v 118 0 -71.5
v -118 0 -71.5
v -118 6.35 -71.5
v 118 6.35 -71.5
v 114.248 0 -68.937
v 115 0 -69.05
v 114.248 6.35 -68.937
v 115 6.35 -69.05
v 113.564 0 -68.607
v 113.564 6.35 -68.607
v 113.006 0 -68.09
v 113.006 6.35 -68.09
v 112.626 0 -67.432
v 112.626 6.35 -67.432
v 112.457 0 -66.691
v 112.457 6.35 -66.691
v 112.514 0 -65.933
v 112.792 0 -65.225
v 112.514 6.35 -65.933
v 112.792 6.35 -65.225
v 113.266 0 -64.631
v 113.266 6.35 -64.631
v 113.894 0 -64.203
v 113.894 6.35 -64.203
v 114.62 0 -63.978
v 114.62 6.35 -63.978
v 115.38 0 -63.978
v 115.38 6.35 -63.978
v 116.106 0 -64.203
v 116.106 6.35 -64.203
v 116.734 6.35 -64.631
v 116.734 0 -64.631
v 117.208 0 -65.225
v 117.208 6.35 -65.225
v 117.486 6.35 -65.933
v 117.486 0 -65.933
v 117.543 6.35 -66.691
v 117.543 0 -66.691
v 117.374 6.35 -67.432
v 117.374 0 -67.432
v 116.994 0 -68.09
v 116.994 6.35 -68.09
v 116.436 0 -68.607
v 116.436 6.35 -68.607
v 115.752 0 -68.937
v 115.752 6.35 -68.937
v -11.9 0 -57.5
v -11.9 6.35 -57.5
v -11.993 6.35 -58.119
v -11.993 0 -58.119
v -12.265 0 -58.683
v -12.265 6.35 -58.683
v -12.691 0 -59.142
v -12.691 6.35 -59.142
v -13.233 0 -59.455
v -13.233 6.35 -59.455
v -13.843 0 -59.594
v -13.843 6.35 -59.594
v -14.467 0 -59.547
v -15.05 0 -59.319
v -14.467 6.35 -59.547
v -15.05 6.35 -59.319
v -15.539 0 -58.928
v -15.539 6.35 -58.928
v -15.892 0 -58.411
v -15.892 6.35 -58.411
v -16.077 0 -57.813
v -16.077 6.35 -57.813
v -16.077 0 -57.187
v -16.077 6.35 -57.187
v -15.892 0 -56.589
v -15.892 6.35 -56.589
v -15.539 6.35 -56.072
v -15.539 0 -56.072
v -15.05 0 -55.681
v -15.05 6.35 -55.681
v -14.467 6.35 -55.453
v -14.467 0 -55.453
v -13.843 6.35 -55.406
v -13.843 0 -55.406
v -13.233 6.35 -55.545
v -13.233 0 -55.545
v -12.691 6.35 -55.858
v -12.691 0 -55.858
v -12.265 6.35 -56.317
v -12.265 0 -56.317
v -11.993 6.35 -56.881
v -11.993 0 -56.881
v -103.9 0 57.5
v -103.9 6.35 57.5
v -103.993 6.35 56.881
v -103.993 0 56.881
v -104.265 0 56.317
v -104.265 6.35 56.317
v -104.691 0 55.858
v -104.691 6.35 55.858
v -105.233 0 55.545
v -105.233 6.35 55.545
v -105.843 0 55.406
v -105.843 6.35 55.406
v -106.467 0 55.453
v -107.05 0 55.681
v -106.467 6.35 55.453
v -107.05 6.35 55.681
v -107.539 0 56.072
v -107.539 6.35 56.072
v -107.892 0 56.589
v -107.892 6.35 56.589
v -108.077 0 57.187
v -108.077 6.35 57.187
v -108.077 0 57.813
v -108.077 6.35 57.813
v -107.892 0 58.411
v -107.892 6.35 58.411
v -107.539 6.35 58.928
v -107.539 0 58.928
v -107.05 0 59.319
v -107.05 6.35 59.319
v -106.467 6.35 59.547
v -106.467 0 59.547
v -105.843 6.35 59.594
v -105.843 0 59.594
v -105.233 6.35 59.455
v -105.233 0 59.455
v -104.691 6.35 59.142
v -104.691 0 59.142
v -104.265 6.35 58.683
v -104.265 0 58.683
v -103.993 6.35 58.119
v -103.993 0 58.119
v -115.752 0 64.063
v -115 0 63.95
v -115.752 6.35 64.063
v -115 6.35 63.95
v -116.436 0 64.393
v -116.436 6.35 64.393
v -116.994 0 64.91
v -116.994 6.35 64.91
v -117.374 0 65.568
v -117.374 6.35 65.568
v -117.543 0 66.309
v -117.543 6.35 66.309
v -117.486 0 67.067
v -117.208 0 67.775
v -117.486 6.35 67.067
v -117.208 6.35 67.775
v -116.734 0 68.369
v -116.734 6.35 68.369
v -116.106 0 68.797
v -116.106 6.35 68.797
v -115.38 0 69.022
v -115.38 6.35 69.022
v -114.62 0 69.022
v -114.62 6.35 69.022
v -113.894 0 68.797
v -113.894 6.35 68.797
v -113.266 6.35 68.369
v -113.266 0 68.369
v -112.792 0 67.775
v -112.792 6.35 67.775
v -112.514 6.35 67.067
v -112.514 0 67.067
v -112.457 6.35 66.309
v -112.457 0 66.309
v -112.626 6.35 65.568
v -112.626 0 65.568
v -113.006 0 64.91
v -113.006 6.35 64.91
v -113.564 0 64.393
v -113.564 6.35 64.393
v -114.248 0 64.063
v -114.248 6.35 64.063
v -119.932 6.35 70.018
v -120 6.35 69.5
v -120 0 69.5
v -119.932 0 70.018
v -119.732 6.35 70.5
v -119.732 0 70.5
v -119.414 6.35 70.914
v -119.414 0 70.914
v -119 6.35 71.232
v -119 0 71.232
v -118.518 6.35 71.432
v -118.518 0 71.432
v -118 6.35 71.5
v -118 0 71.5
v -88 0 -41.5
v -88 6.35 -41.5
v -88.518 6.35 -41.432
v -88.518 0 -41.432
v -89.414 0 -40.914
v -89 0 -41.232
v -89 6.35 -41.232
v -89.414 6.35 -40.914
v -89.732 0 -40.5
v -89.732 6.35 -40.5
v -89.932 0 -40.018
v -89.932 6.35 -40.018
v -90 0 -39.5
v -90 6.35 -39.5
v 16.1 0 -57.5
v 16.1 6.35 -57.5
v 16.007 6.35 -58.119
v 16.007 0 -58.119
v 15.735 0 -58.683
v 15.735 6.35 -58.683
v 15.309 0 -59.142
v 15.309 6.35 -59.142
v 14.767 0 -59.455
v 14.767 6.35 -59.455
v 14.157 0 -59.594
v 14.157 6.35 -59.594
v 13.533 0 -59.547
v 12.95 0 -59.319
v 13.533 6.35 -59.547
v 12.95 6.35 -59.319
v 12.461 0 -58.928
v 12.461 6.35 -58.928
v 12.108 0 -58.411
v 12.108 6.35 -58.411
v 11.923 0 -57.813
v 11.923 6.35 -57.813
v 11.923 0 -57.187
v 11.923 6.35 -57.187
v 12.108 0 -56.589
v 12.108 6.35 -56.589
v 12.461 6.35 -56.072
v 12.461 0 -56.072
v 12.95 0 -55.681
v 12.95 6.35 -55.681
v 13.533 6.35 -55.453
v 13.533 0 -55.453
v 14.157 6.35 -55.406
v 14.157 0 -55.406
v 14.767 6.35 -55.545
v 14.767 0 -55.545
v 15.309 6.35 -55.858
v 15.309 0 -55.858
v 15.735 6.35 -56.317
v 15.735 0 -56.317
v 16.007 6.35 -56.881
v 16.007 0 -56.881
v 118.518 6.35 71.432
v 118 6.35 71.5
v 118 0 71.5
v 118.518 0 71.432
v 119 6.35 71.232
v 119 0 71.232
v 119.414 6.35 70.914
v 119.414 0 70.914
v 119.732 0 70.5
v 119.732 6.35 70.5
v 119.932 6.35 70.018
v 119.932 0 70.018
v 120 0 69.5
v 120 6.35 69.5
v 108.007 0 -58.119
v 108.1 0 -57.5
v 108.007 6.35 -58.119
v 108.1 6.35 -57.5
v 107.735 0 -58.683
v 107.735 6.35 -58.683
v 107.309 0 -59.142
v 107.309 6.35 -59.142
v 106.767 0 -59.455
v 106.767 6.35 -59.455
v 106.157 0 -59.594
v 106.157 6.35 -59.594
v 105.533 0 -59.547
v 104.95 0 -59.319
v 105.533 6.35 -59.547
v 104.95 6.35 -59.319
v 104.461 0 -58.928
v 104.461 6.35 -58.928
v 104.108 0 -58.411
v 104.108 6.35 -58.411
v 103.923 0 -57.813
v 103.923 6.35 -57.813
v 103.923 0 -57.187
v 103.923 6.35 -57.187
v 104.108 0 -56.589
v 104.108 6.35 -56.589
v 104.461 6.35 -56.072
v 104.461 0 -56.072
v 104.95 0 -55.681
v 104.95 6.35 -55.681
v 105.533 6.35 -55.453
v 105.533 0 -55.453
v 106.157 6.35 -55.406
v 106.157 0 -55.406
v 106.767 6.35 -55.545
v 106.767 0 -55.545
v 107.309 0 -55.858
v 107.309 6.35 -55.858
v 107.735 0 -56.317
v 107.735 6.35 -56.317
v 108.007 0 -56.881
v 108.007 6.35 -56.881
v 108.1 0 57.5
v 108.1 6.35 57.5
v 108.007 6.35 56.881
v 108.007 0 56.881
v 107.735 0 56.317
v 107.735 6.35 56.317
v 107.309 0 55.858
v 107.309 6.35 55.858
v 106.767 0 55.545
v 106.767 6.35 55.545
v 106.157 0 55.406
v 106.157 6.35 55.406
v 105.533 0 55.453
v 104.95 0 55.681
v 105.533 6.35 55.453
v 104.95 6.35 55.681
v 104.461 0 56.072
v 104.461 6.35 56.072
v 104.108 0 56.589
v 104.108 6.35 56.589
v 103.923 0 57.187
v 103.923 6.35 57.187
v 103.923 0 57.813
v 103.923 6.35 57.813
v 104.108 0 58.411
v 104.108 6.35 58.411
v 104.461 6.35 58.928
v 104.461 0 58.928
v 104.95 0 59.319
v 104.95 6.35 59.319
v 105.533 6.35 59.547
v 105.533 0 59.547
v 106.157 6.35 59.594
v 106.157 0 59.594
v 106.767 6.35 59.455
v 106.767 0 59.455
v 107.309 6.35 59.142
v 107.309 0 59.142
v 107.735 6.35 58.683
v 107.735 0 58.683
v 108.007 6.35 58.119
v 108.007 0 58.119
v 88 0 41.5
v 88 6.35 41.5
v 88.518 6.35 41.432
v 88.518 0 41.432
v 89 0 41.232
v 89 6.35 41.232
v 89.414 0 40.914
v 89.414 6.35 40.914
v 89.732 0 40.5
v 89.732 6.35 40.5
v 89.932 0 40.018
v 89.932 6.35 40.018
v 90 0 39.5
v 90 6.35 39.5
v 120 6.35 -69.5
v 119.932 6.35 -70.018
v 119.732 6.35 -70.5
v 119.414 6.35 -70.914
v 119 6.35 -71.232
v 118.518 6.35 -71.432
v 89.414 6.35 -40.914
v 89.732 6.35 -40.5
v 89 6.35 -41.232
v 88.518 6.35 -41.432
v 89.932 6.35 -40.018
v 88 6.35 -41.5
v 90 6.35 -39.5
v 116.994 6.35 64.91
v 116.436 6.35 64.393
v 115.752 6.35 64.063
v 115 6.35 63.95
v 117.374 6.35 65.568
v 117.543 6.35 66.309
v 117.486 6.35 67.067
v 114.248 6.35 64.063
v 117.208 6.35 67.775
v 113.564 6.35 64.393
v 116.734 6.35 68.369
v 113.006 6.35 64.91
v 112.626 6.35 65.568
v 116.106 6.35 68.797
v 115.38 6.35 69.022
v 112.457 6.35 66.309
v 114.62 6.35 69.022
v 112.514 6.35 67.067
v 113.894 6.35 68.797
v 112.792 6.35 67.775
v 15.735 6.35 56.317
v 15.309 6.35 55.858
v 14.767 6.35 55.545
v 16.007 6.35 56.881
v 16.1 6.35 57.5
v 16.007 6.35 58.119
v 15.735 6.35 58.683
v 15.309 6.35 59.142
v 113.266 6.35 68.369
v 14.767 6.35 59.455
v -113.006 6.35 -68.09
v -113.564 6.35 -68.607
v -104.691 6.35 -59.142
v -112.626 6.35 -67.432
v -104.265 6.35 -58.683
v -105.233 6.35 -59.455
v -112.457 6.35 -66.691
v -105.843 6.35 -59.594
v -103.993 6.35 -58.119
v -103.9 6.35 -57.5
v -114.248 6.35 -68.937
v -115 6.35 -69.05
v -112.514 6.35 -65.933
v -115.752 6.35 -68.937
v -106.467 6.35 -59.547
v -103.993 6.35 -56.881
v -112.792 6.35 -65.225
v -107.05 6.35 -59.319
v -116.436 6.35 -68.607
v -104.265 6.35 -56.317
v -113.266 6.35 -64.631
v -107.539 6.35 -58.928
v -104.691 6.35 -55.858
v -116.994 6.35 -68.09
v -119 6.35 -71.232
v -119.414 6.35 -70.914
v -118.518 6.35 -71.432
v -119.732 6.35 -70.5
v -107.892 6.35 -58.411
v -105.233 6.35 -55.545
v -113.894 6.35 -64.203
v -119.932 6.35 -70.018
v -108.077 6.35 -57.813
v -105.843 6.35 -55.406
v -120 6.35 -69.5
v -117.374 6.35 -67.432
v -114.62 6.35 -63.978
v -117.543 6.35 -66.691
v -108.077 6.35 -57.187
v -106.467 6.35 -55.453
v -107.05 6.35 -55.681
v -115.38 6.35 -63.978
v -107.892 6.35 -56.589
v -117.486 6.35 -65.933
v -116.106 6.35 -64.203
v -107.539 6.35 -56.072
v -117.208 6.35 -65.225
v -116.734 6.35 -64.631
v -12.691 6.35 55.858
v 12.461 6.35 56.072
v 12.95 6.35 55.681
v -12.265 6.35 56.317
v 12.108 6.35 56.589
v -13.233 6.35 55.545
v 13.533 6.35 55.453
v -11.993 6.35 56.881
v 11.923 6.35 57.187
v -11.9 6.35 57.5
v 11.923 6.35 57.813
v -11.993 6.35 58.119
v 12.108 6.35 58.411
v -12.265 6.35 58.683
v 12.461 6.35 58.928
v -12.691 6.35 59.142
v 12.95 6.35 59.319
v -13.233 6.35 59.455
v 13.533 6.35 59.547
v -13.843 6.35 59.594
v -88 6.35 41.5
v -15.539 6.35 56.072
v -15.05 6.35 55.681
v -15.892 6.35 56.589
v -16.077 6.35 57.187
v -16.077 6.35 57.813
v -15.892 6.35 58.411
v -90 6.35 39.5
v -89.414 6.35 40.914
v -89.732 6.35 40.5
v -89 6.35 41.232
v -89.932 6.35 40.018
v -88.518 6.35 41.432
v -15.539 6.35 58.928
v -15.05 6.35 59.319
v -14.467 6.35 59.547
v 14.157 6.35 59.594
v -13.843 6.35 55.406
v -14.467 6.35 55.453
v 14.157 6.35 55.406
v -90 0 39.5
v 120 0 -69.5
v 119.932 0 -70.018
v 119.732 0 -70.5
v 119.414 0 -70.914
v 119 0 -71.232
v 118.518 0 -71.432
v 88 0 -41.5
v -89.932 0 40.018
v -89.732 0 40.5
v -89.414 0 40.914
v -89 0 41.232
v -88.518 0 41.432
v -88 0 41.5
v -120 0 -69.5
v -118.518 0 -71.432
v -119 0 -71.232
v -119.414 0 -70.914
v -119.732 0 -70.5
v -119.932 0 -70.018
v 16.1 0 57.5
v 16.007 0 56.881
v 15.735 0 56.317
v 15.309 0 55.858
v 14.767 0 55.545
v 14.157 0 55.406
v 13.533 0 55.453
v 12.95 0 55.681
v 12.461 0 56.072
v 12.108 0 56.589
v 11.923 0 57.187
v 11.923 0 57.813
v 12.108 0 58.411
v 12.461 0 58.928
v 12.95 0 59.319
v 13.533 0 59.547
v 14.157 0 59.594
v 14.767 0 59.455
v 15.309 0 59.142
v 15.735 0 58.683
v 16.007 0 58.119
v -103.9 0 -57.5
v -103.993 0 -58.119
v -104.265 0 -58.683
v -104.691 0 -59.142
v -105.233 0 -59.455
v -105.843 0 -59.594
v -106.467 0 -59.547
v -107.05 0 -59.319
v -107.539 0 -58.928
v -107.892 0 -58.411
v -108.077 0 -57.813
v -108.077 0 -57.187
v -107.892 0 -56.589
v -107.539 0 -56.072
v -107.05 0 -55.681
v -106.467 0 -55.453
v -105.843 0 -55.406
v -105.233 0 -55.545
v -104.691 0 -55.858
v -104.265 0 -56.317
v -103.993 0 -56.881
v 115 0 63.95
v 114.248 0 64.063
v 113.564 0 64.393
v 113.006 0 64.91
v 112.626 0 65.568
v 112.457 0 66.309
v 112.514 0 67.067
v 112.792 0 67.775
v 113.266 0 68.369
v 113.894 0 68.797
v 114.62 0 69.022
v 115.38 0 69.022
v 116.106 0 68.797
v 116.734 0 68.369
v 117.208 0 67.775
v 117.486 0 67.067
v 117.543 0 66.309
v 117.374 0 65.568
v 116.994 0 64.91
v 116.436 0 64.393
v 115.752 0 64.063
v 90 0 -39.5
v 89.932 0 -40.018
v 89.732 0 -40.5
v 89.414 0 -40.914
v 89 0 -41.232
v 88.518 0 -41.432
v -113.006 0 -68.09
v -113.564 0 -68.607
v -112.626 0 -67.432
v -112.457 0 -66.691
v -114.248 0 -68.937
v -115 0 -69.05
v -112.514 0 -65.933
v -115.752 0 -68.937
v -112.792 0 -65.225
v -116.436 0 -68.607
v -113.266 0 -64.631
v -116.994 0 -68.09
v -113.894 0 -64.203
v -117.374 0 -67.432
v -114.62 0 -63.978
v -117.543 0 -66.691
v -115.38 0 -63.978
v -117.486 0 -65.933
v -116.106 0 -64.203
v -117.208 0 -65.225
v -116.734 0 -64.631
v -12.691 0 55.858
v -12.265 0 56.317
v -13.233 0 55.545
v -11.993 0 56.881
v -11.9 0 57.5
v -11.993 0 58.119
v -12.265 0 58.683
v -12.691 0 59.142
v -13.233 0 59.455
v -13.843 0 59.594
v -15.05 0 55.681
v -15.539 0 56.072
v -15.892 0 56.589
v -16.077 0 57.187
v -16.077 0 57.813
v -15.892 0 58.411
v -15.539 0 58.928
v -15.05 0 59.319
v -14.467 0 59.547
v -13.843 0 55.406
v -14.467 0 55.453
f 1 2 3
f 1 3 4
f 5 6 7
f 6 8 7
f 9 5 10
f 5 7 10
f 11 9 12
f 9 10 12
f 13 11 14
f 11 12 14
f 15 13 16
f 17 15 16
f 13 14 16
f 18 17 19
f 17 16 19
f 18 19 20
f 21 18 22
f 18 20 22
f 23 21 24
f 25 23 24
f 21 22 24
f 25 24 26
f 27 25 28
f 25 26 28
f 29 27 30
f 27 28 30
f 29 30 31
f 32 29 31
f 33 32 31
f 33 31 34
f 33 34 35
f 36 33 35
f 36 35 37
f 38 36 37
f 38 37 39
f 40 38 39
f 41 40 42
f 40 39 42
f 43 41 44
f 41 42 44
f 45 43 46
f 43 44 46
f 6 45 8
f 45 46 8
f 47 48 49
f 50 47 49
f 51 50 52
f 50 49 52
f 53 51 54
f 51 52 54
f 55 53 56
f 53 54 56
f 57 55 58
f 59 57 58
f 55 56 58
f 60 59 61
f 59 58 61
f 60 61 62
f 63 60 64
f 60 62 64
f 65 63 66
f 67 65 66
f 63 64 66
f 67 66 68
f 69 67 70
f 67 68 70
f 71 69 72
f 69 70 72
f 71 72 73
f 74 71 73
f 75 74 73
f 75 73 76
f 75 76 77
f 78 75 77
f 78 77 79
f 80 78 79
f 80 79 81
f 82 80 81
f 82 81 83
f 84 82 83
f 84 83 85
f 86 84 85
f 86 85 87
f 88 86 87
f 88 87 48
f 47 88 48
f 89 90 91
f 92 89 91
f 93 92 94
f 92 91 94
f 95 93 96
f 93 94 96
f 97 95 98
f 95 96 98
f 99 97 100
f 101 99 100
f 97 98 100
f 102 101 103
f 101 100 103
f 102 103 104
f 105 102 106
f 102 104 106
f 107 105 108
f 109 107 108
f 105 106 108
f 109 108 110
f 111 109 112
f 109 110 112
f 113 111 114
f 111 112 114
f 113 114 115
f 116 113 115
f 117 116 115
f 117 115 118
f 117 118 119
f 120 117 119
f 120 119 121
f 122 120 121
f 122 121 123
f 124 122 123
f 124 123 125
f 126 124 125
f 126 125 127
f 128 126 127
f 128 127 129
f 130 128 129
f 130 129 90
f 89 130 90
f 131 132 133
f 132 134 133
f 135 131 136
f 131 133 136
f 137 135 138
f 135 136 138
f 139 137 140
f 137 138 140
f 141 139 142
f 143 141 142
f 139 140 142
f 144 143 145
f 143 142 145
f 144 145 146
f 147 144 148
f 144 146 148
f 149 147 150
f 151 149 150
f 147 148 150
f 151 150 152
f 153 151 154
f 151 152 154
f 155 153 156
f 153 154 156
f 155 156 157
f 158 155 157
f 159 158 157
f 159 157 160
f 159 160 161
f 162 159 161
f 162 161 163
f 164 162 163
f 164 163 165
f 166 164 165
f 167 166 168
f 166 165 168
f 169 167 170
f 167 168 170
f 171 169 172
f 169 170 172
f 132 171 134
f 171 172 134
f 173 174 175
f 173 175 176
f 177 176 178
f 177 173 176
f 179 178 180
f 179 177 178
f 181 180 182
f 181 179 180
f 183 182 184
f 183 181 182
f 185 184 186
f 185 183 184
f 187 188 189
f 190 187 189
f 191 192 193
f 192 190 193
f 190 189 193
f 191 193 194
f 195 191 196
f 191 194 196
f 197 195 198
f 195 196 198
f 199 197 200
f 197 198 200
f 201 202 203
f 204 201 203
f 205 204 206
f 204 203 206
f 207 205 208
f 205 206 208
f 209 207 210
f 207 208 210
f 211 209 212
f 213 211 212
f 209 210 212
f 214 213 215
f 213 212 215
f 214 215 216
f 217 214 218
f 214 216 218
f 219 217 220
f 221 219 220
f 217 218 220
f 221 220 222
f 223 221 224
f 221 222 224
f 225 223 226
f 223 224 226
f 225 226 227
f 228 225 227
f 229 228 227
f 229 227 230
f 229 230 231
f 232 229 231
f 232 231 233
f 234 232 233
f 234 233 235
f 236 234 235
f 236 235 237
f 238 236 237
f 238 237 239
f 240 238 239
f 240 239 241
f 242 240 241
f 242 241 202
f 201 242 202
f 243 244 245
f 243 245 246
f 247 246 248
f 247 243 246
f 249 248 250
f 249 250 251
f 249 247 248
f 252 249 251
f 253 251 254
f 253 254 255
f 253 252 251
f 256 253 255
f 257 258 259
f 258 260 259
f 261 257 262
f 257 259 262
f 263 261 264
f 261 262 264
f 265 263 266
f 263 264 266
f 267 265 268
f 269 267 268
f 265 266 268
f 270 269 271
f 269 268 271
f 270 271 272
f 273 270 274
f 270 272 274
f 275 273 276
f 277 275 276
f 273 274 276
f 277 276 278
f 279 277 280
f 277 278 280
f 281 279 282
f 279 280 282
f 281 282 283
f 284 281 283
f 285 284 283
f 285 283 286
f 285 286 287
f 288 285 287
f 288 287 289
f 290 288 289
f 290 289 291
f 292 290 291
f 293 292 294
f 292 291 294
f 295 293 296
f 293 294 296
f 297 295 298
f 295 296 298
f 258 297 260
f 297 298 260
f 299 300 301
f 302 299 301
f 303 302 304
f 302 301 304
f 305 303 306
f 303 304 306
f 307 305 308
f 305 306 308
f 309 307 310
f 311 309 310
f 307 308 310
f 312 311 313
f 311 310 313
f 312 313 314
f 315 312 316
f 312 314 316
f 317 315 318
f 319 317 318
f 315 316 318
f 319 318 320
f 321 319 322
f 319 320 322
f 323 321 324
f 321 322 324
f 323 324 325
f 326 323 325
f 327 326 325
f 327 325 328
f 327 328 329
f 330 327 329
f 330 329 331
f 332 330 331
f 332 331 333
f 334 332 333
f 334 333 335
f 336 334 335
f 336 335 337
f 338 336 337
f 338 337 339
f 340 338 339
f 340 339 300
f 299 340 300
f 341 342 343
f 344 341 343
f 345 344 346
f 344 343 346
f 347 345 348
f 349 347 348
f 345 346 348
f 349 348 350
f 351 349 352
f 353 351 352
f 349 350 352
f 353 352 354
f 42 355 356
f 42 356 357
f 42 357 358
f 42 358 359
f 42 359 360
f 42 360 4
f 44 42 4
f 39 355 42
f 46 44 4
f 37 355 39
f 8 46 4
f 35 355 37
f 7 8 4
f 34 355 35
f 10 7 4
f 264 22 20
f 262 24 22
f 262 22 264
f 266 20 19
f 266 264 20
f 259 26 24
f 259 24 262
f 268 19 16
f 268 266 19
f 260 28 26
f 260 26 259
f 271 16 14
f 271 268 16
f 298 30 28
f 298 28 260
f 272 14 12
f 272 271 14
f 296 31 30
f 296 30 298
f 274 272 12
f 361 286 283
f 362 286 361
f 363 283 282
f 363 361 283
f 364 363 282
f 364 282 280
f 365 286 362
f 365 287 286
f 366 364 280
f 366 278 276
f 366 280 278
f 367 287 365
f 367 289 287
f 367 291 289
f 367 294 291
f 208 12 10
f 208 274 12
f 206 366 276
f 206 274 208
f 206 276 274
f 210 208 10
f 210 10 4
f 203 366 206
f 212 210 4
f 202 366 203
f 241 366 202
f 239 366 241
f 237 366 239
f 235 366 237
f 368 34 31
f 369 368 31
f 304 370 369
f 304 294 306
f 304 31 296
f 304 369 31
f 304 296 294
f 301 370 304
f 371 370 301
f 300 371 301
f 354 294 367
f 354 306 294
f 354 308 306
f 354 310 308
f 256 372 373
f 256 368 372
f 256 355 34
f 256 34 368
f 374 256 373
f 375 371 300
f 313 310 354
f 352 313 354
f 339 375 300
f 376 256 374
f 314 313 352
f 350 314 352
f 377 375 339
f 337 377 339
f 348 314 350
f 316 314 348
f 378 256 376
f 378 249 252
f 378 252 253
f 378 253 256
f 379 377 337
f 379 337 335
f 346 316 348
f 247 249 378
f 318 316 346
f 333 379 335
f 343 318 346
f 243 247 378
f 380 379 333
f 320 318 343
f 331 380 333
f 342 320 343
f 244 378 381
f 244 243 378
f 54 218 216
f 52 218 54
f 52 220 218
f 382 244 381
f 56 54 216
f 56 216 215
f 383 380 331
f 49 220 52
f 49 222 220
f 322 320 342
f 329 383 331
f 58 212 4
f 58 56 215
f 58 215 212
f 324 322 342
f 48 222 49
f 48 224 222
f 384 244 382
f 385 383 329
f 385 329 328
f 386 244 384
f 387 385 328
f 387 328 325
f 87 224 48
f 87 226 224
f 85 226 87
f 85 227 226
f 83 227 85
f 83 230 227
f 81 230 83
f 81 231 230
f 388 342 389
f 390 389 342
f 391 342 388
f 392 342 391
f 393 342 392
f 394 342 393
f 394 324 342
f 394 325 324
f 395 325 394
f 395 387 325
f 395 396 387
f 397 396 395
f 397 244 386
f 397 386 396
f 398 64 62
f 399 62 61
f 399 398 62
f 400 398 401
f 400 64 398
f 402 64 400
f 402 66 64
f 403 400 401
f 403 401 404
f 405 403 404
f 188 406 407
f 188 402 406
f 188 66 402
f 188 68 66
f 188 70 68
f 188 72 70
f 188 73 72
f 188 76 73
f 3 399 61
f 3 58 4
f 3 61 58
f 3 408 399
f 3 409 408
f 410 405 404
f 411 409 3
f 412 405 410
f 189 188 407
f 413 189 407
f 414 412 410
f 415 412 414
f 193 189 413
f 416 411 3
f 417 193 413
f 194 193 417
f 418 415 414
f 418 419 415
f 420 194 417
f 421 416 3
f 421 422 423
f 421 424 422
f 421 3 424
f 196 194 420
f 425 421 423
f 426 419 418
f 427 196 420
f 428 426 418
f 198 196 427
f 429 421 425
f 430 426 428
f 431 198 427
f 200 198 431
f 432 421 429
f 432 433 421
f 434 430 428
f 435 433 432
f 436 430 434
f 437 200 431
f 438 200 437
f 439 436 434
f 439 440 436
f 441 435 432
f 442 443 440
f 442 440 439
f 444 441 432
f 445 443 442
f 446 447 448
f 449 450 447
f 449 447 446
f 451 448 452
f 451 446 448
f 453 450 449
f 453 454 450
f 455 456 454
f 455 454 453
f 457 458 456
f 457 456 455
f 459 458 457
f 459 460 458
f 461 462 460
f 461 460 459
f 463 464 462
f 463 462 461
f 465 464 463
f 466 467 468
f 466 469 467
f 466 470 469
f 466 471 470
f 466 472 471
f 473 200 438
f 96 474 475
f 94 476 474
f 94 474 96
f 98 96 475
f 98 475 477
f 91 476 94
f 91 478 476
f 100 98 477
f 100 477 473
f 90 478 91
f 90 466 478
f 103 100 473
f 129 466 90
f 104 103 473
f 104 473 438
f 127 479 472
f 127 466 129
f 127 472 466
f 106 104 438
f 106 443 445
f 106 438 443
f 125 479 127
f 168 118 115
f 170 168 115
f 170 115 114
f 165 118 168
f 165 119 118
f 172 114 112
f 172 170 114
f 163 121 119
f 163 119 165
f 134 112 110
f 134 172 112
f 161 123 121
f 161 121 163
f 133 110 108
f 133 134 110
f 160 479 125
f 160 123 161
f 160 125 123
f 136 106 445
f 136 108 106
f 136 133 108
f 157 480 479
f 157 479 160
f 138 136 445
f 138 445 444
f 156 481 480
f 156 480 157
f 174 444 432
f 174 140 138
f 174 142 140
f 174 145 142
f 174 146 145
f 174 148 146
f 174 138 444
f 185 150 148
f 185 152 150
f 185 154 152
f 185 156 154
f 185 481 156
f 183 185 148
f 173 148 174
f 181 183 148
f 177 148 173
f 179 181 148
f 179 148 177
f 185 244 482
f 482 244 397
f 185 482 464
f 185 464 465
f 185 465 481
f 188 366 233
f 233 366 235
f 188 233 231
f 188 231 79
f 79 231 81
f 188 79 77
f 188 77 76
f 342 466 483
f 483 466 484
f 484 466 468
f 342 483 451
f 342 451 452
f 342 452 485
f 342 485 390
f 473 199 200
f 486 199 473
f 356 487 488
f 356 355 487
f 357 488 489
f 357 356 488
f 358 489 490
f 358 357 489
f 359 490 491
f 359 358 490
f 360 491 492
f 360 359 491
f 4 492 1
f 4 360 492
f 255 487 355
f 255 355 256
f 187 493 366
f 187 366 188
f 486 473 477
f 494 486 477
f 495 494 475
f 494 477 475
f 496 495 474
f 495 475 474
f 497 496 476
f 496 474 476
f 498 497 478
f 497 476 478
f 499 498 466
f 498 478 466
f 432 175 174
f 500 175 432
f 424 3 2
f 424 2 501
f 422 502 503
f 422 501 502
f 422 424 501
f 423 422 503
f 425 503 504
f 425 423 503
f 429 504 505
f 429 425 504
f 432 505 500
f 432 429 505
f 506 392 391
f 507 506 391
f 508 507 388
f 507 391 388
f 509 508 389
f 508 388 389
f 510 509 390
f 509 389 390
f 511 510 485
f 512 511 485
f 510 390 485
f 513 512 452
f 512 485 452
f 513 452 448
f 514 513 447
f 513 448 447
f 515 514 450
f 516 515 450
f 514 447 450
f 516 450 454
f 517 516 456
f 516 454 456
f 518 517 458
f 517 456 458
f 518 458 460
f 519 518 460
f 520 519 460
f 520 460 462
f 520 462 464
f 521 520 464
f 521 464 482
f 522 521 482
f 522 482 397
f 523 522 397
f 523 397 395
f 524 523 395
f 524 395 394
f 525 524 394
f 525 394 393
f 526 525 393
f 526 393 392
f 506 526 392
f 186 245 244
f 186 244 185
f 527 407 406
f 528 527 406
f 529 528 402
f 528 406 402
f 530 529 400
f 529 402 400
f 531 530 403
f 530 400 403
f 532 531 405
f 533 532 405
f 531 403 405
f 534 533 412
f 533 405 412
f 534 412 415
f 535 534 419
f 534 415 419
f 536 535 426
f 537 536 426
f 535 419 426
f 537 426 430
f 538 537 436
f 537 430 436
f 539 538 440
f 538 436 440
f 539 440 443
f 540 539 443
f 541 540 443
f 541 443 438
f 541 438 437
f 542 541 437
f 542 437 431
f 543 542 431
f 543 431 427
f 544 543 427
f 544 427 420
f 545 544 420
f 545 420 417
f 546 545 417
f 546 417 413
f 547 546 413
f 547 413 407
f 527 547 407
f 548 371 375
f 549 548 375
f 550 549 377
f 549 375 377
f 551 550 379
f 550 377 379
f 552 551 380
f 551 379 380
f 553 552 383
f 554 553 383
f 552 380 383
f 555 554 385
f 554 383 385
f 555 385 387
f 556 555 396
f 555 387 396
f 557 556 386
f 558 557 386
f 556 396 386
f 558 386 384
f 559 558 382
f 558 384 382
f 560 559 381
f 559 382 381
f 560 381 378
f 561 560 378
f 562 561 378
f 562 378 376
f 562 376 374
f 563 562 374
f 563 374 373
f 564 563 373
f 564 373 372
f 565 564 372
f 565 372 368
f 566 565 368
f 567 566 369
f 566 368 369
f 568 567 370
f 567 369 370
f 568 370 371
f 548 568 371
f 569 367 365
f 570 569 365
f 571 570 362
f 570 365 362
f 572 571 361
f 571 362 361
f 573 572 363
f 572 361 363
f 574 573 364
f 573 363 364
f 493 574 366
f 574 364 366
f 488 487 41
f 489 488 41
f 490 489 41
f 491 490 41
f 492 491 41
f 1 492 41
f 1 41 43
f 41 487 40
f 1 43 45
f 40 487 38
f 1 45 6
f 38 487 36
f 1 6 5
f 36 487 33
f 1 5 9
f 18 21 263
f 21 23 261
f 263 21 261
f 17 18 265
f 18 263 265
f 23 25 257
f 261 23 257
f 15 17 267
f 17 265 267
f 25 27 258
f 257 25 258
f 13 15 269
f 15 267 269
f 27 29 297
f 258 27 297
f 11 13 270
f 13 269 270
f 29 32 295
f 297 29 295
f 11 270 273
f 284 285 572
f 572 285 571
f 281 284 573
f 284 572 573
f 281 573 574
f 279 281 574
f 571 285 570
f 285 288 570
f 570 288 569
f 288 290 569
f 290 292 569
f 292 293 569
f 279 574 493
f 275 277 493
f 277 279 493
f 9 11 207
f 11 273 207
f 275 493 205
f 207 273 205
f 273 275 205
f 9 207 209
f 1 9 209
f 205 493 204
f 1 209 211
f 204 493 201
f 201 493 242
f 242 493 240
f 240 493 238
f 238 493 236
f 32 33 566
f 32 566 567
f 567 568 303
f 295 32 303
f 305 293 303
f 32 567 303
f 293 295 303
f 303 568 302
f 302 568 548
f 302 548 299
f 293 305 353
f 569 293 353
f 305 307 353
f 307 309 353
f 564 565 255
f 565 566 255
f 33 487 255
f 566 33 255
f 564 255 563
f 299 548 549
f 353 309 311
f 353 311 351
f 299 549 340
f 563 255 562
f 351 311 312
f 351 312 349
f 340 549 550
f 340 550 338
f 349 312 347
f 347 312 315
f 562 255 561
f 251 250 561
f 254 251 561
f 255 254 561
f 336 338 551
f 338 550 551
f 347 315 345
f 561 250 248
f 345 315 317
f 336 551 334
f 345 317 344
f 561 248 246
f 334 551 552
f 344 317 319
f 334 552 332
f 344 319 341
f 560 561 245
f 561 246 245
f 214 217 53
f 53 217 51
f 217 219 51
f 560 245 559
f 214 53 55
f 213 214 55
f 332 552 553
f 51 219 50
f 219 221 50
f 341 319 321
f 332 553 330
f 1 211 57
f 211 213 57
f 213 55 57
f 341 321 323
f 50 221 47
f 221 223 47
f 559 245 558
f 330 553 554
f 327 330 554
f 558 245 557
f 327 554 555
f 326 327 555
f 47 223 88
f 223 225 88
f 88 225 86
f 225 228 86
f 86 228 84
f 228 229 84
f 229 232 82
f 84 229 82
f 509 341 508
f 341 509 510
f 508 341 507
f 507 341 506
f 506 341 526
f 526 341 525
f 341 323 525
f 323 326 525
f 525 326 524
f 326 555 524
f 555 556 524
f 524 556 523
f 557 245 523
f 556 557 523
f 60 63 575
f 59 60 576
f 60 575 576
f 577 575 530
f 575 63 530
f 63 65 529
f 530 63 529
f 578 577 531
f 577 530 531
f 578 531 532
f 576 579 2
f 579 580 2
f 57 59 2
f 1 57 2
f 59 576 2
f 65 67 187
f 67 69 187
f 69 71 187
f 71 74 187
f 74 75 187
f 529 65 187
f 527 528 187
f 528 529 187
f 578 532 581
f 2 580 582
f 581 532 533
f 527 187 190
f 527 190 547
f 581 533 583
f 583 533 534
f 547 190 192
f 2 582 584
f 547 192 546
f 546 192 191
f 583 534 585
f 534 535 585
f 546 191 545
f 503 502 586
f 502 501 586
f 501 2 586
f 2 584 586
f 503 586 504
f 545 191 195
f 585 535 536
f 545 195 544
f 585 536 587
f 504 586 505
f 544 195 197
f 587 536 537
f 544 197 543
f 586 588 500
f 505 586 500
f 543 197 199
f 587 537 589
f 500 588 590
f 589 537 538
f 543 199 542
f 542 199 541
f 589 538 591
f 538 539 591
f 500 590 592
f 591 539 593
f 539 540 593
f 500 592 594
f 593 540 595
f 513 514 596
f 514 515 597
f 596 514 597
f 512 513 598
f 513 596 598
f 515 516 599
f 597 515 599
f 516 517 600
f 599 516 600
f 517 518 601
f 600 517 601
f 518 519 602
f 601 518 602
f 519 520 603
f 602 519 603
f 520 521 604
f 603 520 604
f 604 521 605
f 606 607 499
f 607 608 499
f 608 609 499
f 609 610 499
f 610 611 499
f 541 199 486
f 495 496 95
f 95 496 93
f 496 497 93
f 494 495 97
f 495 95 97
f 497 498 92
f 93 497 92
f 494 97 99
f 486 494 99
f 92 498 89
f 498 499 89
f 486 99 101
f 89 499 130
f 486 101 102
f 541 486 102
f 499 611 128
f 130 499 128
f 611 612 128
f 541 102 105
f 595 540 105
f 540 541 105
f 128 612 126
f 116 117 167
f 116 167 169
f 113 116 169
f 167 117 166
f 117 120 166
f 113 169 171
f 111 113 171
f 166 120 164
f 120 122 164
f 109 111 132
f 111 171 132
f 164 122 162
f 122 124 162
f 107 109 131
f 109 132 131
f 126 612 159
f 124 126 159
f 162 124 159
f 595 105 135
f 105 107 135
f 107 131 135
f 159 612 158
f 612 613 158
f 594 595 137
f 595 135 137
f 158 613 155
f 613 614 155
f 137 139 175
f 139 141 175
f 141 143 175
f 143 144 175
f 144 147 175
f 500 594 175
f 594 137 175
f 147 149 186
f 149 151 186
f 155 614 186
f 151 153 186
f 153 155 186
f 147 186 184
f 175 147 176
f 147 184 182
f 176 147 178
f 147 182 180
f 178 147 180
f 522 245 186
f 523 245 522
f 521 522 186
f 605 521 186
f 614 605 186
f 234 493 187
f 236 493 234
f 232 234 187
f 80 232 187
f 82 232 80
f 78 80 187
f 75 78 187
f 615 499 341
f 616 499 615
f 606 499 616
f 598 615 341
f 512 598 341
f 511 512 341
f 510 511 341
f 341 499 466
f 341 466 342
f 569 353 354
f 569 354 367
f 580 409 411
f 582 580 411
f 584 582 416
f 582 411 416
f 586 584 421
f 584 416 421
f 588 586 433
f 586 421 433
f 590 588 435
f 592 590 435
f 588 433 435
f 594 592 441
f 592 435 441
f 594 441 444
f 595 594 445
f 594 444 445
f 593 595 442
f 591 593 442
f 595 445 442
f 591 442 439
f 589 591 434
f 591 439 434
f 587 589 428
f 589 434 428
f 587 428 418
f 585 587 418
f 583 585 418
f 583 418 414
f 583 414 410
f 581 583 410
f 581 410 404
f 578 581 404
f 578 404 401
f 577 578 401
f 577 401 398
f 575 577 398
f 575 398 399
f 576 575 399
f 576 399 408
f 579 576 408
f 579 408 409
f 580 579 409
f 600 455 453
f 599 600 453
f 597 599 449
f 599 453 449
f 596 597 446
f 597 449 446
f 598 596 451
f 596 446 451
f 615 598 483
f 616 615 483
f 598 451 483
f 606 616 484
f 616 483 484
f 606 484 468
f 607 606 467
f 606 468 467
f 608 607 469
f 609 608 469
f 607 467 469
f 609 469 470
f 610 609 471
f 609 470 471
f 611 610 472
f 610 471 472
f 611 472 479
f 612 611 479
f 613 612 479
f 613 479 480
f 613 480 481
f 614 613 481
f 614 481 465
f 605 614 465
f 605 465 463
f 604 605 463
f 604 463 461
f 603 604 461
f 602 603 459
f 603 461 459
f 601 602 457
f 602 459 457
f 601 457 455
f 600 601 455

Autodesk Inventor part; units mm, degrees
ref_plane "YZ Plane" through (0, 0, 0) normal (1, 0, 0) x (0, 1, 0)
ref_plane "XZ Plane" through (0, 0, 0) normal (0, 1, 0) x (-1, 0, 0)
ref_plane "XY Plane" through (0, 0, 0) normal (0, 0, 1) x (1, 0, 0)
sketch "Sketch1" plane through (0, 0, 0) normal (0, 1, 0) x (-1, 0, 0)
  line L0 (-120, 71.5) -> (120, 71.5)
  line L1 (120, 71.5) -> (120, 41.5)
  line L2 (120, 41.5) -> (-120, 41.5)
  line L3 (-120, 41.5) -> (-120, 71.5)
  line L4 (-120, -41.5) -> (120, -41.5)
  line L5 (120, -41.5) -> (120, -71.5)
  line L6 (120, -71.5) -> (-120, -71.5)
  line L7 (-120, -71.5) -> (-120, -41.5)
  line L8 (168, 0) -> (-168, 0) projected
  line L9 (0, -100.1) -> (0, 100.1) projected
  line L10 (120, 41.5) -> (-120, 41.5)
  line L11 (-120, 41.5) -> (-120, -41.5)
  line L12 (-120, -41.5) -> (120, -41.5)
  line L13 (120, -41.5) -> (120, 41.5)
  line L14 (90, 41.5) -> (-90, 41.5)
  line L15 (-90, 41.5) -> (-90, -41.5)
  line L16 (-90, -41.5) -> (90, -41.5)
  line L17 (90, -41.5) -> (90, 41.5)
  line L18 (-115, 66.5) -> (115, 66.5) construction
  line L19 (115, 66.5) -> (115, -66.5) construction
  line L20 (115, -66.5) -> (-115, -66.5) construction
  line L21 (-115, -66.5) -> (-115, 66.5) construction
  point P0 (0, 0)
  point P1 (0, 41.5)
  dimension "d0" = 240
  dimension "d2" = 30
  dimension "d4" = 143
  dimension "d55" = 30
  dimension "d56" = 5
  dimension "d57" = 5
extrude "Extrusion1" add sketch "Sketch1" along normal blind 6.35 contours L0 L9 L2 L3 | L0 L1 L2 L9 | L2 L15 L8 L11 | L8 L15 L4 L11 | L13 L8 L17 L2 | L4 L9 L6 L7 | L13 L4 L17 L8 | L4 L5 L6 L9
sketch "Sketch2" plane through (0, 6.35, 0) normal (0, 1, 0) x (1, 0, 0)
  line L0 (-110, -61.5) -> (-10, -61.5)
  line L1 (-10, -61.5) -> (-10, 61.5)
  line L2 (-10, 61.5) -> (-110, 61.5)
  line L3 (-110, 61.5) -> (-110, -61.5)
  line L4 (-120, -71.5) -> (-120, 71.5) projected
  line L5 (-120, -71.5) -> (120, -71.5) projected
  line L6 (10, -61.5) -> (110, -61.5)
  line L7 (110, -61.5) -> (110, 61.5)
  line L8 (110, 61.5) -> (10, 61.5)
  line L9 (10, 61.5) -> (10, -61.5)
  circle A0 centre (-106, -57.5) radius 2.1
  circle A1 centre (-106, 57.5) radius 2.1
  circle A2 centre (-14, -57.5) radius 2.1
  circle A3 centre (-14, 57.5) radius 2.1
  circle A4 centre (14, -57.5) radius 2.1
  circle A5 centre (14, 57.5) radius 2.1
  circle A6 centre (106, -57.5) radius 2.1
  circle A7 centre (106, 57.5) radius 2.1
  point P0 (0, 0)
  point P1 (-120, -41.5)
  dimension "d7" = 123
  dimension "d8" = 100
  dimension "d9" = 10
  dimension "d10" = 10
  dimension "d11" = 100
  dimension "d12" = 123
  dimension "d13" = 20
  dimension "d14" = 4.2
  dimension "d15" = 4
  dimension "d16" = 4
  dimension "d17" = 4.2
  dimension "d18" = 4
  dimension "d19" = 4
  dimension "d20" = 4.2
  dimension "d21" = 4
  dimension "d22" = 4
  dimension "d23" = 4.2
  dimension "d24" = 4
  dimension "d25" = 4
  dimension "d26" = 4.2
  dimension "d27" = 4
  dimension "d28" = 4
  dimension "d29" = 4.2
  dimension "d30" = 4
  dimension "d31" = 4
  dimension "d32" = 4.2
  dimension "d33" = 4
  dimension "d34" = 4
  dimension "d35" = 4.2
  dimension "d36" = 4
  dimension "d37" = 4
  dimension "d38" = 10
extrude "Extrusion2" cut sketch "Sketch2" against normal through all contours A0 | A1 | A2 | A3 | A4 | A5 | A6 | A7
sketch "Sketch3" plane through (0, 6.35, 0) normal (0, 1, 0) x (1, 0, 0)
  circle A0 centre (-115, -66.5) radius 2.5
  line L0 (-120, -71.5) -> (-120, 71.5) projected
  line L1 (120, -71.5) -> (-120, -71.5) projected
  circle A1 centre (-115, 66.5) radius 2.5
  line L2 (-120, 41.5) -> (-120, 71.5) projected
  line L3 (-120, 71.5) -> (120, 71.5) projected
  circle A2 centre (115, -66.5) radius 2.5
  line L4 (120, -71.5) -> (120, 71.5) projected
  circle A3 centre (115, 66.5) radius 2.5
  line L5 (120, 41.5) -> (120, 71.5) projected
  point P0 (0, 0)
  point P1 (-120, -41.5)
  point P2 (120, -41.5)
  dimension "d41" = 5
  dimension "d42" = 5
  dimension "d43" = 5
  dimension "d44" = 5
  dimension "d45" = 5
  dimension "d46" = 5
  dimension "d47" = 5
  dimension "d48" = 5
  dimension "d49" = 5
  dimension "d50" = 5
  dimension "d51" = 5
  dimension "d52" = 5
extrude "Extrusion3" [suppressed]
hole "Hole1" at (115, 0, 66.5) at (115, 0, -66.5) at (-115, 0, -66.5) at (-115, 0, 66.5) direction (0, 1, 0) diameter 5.1 end through all
fillet "Fillet1" radius 2 8 edges at (90, 3.175, 41.5) (90, 3.175, -41.5) (-90, 3.175, 41.5) (-90, 3.175, -41.5) (-120, 3.175, 71.5) (-120, 3.175, -71.5) (120, 3.175, -71.5) (120, 3.175, 71.5)
sketch "Sketch5" plane through (0, 0, 0) normal (0, 1, 0) x (-1, 0, 0)
  point P0 (0, 0)
properties part number "BoardMountingBracket"
